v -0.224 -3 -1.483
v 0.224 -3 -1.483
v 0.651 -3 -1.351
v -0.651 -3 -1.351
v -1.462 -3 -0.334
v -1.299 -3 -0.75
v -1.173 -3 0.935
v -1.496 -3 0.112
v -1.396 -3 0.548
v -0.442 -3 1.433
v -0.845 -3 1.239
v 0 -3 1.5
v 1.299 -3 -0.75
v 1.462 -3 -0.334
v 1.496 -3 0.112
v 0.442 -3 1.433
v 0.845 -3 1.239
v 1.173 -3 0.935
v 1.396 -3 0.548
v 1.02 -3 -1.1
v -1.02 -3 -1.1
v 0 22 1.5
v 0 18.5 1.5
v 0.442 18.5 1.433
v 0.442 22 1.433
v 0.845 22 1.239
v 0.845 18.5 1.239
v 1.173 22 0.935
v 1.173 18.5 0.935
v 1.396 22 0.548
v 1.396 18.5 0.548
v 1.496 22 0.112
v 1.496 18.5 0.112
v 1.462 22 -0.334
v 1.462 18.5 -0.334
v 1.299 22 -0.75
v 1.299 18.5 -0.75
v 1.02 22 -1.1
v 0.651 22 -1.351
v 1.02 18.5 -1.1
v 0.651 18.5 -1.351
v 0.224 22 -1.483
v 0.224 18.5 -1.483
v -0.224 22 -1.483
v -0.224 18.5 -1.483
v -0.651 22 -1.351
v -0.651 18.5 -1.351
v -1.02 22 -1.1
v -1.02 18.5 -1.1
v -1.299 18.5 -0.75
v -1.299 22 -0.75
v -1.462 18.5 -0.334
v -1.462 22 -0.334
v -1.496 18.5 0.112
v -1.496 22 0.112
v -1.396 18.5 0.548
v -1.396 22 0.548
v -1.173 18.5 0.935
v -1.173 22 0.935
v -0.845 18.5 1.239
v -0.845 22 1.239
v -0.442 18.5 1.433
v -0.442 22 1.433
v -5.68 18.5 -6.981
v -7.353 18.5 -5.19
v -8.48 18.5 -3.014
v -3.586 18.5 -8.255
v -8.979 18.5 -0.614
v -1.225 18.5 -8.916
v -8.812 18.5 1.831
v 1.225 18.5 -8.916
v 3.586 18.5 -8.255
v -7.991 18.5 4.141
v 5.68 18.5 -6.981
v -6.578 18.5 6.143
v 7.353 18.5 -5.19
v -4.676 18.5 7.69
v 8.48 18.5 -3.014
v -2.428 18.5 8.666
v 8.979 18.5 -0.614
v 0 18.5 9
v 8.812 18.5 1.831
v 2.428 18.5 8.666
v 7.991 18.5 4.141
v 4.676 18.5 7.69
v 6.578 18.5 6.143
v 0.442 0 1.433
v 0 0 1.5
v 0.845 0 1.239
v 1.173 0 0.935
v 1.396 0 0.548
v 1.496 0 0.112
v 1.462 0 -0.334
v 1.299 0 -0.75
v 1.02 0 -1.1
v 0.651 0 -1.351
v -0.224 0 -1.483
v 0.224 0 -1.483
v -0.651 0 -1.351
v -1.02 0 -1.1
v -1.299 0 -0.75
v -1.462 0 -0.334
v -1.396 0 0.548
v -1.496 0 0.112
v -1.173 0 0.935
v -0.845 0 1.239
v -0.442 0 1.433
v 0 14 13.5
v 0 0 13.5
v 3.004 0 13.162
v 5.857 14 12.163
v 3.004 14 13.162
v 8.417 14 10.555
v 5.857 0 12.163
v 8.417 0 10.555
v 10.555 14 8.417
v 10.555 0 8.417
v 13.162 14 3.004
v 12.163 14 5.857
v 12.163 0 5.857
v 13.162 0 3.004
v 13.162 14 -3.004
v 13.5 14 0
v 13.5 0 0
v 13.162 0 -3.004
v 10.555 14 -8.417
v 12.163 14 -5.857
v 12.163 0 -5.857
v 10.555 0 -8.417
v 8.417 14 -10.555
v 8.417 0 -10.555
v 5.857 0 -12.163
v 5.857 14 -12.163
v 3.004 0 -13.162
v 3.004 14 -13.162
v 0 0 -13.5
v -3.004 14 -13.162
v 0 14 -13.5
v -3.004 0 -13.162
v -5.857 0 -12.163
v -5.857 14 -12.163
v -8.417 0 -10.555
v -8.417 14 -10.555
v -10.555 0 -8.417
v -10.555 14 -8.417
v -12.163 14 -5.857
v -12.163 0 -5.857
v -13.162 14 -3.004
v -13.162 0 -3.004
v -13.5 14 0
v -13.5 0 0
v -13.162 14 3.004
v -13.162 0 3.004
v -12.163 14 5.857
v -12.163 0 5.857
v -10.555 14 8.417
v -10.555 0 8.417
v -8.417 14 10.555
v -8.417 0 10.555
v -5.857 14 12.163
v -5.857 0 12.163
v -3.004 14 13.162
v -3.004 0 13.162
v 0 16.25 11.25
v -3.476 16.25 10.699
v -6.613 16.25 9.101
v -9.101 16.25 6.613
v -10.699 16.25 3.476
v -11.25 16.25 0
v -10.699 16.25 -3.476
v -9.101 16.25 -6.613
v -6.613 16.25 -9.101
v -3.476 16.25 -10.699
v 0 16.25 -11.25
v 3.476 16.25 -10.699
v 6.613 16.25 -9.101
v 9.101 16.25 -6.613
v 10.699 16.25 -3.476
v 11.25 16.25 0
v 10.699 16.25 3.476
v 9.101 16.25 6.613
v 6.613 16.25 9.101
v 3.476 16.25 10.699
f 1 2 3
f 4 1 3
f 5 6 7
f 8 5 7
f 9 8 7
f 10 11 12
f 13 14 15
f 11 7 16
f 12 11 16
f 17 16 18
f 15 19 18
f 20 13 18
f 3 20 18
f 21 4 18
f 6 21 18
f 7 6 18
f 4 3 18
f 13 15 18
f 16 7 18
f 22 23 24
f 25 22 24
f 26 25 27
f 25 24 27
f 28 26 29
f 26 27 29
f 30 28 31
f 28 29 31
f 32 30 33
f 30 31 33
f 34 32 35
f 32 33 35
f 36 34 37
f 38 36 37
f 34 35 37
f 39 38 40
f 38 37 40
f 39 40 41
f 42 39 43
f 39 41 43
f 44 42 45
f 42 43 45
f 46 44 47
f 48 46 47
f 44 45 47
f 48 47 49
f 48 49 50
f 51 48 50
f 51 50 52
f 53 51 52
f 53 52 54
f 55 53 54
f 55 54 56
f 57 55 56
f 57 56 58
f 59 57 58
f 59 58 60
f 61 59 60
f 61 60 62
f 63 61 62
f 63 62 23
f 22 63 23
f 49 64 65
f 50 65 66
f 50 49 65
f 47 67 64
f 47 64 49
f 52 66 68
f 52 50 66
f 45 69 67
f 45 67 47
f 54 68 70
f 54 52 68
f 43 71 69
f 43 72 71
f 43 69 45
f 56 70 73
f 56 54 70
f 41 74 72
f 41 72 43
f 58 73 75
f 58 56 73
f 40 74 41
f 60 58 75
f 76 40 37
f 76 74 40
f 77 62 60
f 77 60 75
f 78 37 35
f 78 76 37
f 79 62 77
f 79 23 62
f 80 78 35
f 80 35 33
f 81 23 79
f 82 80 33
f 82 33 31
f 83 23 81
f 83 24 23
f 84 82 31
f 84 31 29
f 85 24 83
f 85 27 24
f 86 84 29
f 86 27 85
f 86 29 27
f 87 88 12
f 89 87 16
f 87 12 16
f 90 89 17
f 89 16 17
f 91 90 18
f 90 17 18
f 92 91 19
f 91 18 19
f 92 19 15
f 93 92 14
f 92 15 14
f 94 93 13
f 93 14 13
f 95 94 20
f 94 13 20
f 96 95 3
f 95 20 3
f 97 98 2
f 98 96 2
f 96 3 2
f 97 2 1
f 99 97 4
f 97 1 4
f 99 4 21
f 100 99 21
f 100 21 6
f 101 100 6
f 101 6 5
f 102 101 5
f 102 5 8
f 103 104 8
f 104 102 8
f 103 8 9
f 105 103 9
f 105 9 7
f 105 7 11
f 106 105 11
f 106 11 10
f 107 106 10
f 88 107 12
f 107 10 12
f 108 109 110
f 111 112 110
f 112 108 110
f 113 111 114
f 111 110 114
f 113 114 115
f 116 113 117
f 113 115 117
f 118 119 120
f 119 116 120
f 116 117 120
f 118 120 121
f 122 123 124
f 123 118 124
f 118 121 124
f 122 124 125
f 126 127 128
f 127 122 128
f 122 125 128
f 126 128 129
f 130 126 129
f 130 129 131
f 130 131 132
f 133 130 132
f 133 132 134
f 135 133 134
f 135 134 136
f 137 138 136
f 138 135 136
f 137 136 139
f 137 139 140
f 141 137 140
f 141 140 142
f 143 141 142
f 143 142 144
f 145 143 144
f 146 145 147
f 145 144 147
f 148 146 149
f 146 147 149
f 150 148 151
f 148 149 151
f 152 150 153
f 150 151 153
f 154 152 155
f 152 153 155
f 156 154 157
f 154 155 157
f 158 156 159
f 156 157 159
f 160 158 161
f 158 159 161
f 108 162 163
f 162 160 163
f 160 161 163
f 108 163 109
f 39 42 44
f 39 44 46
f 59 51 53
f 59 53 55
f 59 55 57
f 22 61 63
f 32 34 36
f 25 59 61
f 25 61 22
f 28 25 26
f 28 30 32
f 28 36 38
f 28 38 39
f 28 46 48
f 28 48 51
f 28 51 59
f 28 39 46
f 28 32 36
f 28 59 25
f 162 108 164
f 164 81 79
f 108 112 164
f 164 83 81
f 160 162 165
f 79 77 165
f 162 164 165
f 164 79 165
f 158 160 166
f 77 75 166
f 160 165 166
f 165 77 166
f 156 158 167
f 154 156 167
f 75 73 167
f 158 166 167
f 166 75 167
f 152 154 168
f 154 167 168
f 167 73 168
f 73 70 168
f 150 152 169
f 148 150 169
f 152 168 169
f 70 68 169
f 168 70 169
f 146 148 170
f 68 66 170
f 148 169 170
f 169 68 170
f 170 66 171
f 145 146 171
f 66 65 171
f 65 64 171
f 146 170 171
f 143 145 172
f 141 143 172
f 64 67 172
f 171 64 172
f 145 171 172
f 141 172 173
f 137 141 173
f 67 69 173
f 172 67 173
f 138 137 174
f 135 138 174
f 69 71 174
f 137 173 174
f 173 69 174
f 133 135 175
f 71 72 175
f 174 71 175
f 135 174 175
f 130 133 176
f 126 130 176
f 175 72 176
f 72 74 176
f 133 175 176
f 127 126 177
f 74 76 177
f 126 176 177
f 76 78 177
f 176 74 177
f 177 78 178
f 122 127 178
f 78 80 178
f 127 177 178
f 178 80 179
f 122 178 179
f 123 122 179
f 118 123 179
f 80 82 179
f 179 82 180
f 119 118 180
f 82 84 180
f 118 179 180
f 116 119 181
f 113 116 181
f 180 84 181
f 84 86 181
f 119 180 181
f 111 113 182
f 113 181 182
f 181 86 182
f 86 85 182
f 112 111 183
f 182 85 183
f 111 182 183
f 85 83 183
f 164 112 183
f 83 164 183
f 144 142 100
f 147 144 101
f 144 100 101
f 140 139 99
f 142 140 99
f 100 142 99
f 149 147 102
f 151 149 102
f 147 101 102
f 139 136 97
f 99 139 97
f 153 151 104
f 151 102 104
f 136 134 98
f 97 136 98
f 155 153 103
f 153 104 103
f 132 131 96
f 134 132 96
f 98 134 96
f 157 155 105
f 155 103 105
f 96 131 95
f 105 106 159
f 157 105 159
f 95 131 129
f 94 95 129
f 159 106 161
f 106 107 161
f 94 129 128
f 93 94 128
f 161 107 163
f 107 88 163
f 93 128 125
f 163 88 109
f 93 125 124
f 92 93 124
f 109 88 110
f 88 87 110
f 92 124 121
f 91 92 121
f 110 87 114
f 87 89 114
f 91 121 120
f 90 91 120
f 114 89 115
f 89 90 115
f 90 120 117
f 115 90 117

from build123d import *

# Parameters (mm, degrees)
SKETCH1_R                = 13.5
BOSS_EXTRUDE1_DEPTH      = 18.5
BOSS_EXTRUDE2_DEPTH      = 3.5
BOSS_EXTRUDE2_DEPTH_BACK = 21.5
SKETCH3_R                = 1.5


with BuildPart() as part:
    # Sketch1 → Boss-Extrude1 (new body)
    with BuildSketch(Plane(origin=(0, 0, 0), x_dir=(1, 0, 0), z_dir=(0, 1, 0))):
        with Locations(Location((0, 0, 0), (0, 0, 270))):
            Circle(SKETCH1_R)
    extrude(amount=BOSS_EXTRUDE1_DEPTH)

    # Sketch2 → Cut-Revolve1 (revolve, cut)
    with BuildSketch(Plane.XY, mode=Mode.PRIVATE) as cut_revolve1_sk:
        Polygon((-13.5, 14), (-9, 18.5), (-13.5, 18.5), align=None)
    revolve(cut_revolve1_sk.sketch.rotate(Axis((0, 18.5, 0), (0, -1, 0)), 270), axis=Axis((0, 18.5, 0), (0, -1, 0)), mode=Mode.SUBTRACT)

    # Sketch3 → Boss-Extrude2 (add, two sides: drawn at the far end of the back side and taken through both)
    with BuildSketch(Plane(origin=(0, 18.5, 0), x_dir=(1, 0, 0), z_dir=(0, 1, 0)).offset(-BOSS_EXTRUDE2_DEPTH_BACK)):
        with Locations(Location((0, 0, 0), (0, 0, 270))):
            Circle(SKETCH3_R)
    extrude(amount=BOSS_EXTRUDE2_DEPTH + BOSS_EXTRUDE2_DEPTH_BACK)


solid = part.part
